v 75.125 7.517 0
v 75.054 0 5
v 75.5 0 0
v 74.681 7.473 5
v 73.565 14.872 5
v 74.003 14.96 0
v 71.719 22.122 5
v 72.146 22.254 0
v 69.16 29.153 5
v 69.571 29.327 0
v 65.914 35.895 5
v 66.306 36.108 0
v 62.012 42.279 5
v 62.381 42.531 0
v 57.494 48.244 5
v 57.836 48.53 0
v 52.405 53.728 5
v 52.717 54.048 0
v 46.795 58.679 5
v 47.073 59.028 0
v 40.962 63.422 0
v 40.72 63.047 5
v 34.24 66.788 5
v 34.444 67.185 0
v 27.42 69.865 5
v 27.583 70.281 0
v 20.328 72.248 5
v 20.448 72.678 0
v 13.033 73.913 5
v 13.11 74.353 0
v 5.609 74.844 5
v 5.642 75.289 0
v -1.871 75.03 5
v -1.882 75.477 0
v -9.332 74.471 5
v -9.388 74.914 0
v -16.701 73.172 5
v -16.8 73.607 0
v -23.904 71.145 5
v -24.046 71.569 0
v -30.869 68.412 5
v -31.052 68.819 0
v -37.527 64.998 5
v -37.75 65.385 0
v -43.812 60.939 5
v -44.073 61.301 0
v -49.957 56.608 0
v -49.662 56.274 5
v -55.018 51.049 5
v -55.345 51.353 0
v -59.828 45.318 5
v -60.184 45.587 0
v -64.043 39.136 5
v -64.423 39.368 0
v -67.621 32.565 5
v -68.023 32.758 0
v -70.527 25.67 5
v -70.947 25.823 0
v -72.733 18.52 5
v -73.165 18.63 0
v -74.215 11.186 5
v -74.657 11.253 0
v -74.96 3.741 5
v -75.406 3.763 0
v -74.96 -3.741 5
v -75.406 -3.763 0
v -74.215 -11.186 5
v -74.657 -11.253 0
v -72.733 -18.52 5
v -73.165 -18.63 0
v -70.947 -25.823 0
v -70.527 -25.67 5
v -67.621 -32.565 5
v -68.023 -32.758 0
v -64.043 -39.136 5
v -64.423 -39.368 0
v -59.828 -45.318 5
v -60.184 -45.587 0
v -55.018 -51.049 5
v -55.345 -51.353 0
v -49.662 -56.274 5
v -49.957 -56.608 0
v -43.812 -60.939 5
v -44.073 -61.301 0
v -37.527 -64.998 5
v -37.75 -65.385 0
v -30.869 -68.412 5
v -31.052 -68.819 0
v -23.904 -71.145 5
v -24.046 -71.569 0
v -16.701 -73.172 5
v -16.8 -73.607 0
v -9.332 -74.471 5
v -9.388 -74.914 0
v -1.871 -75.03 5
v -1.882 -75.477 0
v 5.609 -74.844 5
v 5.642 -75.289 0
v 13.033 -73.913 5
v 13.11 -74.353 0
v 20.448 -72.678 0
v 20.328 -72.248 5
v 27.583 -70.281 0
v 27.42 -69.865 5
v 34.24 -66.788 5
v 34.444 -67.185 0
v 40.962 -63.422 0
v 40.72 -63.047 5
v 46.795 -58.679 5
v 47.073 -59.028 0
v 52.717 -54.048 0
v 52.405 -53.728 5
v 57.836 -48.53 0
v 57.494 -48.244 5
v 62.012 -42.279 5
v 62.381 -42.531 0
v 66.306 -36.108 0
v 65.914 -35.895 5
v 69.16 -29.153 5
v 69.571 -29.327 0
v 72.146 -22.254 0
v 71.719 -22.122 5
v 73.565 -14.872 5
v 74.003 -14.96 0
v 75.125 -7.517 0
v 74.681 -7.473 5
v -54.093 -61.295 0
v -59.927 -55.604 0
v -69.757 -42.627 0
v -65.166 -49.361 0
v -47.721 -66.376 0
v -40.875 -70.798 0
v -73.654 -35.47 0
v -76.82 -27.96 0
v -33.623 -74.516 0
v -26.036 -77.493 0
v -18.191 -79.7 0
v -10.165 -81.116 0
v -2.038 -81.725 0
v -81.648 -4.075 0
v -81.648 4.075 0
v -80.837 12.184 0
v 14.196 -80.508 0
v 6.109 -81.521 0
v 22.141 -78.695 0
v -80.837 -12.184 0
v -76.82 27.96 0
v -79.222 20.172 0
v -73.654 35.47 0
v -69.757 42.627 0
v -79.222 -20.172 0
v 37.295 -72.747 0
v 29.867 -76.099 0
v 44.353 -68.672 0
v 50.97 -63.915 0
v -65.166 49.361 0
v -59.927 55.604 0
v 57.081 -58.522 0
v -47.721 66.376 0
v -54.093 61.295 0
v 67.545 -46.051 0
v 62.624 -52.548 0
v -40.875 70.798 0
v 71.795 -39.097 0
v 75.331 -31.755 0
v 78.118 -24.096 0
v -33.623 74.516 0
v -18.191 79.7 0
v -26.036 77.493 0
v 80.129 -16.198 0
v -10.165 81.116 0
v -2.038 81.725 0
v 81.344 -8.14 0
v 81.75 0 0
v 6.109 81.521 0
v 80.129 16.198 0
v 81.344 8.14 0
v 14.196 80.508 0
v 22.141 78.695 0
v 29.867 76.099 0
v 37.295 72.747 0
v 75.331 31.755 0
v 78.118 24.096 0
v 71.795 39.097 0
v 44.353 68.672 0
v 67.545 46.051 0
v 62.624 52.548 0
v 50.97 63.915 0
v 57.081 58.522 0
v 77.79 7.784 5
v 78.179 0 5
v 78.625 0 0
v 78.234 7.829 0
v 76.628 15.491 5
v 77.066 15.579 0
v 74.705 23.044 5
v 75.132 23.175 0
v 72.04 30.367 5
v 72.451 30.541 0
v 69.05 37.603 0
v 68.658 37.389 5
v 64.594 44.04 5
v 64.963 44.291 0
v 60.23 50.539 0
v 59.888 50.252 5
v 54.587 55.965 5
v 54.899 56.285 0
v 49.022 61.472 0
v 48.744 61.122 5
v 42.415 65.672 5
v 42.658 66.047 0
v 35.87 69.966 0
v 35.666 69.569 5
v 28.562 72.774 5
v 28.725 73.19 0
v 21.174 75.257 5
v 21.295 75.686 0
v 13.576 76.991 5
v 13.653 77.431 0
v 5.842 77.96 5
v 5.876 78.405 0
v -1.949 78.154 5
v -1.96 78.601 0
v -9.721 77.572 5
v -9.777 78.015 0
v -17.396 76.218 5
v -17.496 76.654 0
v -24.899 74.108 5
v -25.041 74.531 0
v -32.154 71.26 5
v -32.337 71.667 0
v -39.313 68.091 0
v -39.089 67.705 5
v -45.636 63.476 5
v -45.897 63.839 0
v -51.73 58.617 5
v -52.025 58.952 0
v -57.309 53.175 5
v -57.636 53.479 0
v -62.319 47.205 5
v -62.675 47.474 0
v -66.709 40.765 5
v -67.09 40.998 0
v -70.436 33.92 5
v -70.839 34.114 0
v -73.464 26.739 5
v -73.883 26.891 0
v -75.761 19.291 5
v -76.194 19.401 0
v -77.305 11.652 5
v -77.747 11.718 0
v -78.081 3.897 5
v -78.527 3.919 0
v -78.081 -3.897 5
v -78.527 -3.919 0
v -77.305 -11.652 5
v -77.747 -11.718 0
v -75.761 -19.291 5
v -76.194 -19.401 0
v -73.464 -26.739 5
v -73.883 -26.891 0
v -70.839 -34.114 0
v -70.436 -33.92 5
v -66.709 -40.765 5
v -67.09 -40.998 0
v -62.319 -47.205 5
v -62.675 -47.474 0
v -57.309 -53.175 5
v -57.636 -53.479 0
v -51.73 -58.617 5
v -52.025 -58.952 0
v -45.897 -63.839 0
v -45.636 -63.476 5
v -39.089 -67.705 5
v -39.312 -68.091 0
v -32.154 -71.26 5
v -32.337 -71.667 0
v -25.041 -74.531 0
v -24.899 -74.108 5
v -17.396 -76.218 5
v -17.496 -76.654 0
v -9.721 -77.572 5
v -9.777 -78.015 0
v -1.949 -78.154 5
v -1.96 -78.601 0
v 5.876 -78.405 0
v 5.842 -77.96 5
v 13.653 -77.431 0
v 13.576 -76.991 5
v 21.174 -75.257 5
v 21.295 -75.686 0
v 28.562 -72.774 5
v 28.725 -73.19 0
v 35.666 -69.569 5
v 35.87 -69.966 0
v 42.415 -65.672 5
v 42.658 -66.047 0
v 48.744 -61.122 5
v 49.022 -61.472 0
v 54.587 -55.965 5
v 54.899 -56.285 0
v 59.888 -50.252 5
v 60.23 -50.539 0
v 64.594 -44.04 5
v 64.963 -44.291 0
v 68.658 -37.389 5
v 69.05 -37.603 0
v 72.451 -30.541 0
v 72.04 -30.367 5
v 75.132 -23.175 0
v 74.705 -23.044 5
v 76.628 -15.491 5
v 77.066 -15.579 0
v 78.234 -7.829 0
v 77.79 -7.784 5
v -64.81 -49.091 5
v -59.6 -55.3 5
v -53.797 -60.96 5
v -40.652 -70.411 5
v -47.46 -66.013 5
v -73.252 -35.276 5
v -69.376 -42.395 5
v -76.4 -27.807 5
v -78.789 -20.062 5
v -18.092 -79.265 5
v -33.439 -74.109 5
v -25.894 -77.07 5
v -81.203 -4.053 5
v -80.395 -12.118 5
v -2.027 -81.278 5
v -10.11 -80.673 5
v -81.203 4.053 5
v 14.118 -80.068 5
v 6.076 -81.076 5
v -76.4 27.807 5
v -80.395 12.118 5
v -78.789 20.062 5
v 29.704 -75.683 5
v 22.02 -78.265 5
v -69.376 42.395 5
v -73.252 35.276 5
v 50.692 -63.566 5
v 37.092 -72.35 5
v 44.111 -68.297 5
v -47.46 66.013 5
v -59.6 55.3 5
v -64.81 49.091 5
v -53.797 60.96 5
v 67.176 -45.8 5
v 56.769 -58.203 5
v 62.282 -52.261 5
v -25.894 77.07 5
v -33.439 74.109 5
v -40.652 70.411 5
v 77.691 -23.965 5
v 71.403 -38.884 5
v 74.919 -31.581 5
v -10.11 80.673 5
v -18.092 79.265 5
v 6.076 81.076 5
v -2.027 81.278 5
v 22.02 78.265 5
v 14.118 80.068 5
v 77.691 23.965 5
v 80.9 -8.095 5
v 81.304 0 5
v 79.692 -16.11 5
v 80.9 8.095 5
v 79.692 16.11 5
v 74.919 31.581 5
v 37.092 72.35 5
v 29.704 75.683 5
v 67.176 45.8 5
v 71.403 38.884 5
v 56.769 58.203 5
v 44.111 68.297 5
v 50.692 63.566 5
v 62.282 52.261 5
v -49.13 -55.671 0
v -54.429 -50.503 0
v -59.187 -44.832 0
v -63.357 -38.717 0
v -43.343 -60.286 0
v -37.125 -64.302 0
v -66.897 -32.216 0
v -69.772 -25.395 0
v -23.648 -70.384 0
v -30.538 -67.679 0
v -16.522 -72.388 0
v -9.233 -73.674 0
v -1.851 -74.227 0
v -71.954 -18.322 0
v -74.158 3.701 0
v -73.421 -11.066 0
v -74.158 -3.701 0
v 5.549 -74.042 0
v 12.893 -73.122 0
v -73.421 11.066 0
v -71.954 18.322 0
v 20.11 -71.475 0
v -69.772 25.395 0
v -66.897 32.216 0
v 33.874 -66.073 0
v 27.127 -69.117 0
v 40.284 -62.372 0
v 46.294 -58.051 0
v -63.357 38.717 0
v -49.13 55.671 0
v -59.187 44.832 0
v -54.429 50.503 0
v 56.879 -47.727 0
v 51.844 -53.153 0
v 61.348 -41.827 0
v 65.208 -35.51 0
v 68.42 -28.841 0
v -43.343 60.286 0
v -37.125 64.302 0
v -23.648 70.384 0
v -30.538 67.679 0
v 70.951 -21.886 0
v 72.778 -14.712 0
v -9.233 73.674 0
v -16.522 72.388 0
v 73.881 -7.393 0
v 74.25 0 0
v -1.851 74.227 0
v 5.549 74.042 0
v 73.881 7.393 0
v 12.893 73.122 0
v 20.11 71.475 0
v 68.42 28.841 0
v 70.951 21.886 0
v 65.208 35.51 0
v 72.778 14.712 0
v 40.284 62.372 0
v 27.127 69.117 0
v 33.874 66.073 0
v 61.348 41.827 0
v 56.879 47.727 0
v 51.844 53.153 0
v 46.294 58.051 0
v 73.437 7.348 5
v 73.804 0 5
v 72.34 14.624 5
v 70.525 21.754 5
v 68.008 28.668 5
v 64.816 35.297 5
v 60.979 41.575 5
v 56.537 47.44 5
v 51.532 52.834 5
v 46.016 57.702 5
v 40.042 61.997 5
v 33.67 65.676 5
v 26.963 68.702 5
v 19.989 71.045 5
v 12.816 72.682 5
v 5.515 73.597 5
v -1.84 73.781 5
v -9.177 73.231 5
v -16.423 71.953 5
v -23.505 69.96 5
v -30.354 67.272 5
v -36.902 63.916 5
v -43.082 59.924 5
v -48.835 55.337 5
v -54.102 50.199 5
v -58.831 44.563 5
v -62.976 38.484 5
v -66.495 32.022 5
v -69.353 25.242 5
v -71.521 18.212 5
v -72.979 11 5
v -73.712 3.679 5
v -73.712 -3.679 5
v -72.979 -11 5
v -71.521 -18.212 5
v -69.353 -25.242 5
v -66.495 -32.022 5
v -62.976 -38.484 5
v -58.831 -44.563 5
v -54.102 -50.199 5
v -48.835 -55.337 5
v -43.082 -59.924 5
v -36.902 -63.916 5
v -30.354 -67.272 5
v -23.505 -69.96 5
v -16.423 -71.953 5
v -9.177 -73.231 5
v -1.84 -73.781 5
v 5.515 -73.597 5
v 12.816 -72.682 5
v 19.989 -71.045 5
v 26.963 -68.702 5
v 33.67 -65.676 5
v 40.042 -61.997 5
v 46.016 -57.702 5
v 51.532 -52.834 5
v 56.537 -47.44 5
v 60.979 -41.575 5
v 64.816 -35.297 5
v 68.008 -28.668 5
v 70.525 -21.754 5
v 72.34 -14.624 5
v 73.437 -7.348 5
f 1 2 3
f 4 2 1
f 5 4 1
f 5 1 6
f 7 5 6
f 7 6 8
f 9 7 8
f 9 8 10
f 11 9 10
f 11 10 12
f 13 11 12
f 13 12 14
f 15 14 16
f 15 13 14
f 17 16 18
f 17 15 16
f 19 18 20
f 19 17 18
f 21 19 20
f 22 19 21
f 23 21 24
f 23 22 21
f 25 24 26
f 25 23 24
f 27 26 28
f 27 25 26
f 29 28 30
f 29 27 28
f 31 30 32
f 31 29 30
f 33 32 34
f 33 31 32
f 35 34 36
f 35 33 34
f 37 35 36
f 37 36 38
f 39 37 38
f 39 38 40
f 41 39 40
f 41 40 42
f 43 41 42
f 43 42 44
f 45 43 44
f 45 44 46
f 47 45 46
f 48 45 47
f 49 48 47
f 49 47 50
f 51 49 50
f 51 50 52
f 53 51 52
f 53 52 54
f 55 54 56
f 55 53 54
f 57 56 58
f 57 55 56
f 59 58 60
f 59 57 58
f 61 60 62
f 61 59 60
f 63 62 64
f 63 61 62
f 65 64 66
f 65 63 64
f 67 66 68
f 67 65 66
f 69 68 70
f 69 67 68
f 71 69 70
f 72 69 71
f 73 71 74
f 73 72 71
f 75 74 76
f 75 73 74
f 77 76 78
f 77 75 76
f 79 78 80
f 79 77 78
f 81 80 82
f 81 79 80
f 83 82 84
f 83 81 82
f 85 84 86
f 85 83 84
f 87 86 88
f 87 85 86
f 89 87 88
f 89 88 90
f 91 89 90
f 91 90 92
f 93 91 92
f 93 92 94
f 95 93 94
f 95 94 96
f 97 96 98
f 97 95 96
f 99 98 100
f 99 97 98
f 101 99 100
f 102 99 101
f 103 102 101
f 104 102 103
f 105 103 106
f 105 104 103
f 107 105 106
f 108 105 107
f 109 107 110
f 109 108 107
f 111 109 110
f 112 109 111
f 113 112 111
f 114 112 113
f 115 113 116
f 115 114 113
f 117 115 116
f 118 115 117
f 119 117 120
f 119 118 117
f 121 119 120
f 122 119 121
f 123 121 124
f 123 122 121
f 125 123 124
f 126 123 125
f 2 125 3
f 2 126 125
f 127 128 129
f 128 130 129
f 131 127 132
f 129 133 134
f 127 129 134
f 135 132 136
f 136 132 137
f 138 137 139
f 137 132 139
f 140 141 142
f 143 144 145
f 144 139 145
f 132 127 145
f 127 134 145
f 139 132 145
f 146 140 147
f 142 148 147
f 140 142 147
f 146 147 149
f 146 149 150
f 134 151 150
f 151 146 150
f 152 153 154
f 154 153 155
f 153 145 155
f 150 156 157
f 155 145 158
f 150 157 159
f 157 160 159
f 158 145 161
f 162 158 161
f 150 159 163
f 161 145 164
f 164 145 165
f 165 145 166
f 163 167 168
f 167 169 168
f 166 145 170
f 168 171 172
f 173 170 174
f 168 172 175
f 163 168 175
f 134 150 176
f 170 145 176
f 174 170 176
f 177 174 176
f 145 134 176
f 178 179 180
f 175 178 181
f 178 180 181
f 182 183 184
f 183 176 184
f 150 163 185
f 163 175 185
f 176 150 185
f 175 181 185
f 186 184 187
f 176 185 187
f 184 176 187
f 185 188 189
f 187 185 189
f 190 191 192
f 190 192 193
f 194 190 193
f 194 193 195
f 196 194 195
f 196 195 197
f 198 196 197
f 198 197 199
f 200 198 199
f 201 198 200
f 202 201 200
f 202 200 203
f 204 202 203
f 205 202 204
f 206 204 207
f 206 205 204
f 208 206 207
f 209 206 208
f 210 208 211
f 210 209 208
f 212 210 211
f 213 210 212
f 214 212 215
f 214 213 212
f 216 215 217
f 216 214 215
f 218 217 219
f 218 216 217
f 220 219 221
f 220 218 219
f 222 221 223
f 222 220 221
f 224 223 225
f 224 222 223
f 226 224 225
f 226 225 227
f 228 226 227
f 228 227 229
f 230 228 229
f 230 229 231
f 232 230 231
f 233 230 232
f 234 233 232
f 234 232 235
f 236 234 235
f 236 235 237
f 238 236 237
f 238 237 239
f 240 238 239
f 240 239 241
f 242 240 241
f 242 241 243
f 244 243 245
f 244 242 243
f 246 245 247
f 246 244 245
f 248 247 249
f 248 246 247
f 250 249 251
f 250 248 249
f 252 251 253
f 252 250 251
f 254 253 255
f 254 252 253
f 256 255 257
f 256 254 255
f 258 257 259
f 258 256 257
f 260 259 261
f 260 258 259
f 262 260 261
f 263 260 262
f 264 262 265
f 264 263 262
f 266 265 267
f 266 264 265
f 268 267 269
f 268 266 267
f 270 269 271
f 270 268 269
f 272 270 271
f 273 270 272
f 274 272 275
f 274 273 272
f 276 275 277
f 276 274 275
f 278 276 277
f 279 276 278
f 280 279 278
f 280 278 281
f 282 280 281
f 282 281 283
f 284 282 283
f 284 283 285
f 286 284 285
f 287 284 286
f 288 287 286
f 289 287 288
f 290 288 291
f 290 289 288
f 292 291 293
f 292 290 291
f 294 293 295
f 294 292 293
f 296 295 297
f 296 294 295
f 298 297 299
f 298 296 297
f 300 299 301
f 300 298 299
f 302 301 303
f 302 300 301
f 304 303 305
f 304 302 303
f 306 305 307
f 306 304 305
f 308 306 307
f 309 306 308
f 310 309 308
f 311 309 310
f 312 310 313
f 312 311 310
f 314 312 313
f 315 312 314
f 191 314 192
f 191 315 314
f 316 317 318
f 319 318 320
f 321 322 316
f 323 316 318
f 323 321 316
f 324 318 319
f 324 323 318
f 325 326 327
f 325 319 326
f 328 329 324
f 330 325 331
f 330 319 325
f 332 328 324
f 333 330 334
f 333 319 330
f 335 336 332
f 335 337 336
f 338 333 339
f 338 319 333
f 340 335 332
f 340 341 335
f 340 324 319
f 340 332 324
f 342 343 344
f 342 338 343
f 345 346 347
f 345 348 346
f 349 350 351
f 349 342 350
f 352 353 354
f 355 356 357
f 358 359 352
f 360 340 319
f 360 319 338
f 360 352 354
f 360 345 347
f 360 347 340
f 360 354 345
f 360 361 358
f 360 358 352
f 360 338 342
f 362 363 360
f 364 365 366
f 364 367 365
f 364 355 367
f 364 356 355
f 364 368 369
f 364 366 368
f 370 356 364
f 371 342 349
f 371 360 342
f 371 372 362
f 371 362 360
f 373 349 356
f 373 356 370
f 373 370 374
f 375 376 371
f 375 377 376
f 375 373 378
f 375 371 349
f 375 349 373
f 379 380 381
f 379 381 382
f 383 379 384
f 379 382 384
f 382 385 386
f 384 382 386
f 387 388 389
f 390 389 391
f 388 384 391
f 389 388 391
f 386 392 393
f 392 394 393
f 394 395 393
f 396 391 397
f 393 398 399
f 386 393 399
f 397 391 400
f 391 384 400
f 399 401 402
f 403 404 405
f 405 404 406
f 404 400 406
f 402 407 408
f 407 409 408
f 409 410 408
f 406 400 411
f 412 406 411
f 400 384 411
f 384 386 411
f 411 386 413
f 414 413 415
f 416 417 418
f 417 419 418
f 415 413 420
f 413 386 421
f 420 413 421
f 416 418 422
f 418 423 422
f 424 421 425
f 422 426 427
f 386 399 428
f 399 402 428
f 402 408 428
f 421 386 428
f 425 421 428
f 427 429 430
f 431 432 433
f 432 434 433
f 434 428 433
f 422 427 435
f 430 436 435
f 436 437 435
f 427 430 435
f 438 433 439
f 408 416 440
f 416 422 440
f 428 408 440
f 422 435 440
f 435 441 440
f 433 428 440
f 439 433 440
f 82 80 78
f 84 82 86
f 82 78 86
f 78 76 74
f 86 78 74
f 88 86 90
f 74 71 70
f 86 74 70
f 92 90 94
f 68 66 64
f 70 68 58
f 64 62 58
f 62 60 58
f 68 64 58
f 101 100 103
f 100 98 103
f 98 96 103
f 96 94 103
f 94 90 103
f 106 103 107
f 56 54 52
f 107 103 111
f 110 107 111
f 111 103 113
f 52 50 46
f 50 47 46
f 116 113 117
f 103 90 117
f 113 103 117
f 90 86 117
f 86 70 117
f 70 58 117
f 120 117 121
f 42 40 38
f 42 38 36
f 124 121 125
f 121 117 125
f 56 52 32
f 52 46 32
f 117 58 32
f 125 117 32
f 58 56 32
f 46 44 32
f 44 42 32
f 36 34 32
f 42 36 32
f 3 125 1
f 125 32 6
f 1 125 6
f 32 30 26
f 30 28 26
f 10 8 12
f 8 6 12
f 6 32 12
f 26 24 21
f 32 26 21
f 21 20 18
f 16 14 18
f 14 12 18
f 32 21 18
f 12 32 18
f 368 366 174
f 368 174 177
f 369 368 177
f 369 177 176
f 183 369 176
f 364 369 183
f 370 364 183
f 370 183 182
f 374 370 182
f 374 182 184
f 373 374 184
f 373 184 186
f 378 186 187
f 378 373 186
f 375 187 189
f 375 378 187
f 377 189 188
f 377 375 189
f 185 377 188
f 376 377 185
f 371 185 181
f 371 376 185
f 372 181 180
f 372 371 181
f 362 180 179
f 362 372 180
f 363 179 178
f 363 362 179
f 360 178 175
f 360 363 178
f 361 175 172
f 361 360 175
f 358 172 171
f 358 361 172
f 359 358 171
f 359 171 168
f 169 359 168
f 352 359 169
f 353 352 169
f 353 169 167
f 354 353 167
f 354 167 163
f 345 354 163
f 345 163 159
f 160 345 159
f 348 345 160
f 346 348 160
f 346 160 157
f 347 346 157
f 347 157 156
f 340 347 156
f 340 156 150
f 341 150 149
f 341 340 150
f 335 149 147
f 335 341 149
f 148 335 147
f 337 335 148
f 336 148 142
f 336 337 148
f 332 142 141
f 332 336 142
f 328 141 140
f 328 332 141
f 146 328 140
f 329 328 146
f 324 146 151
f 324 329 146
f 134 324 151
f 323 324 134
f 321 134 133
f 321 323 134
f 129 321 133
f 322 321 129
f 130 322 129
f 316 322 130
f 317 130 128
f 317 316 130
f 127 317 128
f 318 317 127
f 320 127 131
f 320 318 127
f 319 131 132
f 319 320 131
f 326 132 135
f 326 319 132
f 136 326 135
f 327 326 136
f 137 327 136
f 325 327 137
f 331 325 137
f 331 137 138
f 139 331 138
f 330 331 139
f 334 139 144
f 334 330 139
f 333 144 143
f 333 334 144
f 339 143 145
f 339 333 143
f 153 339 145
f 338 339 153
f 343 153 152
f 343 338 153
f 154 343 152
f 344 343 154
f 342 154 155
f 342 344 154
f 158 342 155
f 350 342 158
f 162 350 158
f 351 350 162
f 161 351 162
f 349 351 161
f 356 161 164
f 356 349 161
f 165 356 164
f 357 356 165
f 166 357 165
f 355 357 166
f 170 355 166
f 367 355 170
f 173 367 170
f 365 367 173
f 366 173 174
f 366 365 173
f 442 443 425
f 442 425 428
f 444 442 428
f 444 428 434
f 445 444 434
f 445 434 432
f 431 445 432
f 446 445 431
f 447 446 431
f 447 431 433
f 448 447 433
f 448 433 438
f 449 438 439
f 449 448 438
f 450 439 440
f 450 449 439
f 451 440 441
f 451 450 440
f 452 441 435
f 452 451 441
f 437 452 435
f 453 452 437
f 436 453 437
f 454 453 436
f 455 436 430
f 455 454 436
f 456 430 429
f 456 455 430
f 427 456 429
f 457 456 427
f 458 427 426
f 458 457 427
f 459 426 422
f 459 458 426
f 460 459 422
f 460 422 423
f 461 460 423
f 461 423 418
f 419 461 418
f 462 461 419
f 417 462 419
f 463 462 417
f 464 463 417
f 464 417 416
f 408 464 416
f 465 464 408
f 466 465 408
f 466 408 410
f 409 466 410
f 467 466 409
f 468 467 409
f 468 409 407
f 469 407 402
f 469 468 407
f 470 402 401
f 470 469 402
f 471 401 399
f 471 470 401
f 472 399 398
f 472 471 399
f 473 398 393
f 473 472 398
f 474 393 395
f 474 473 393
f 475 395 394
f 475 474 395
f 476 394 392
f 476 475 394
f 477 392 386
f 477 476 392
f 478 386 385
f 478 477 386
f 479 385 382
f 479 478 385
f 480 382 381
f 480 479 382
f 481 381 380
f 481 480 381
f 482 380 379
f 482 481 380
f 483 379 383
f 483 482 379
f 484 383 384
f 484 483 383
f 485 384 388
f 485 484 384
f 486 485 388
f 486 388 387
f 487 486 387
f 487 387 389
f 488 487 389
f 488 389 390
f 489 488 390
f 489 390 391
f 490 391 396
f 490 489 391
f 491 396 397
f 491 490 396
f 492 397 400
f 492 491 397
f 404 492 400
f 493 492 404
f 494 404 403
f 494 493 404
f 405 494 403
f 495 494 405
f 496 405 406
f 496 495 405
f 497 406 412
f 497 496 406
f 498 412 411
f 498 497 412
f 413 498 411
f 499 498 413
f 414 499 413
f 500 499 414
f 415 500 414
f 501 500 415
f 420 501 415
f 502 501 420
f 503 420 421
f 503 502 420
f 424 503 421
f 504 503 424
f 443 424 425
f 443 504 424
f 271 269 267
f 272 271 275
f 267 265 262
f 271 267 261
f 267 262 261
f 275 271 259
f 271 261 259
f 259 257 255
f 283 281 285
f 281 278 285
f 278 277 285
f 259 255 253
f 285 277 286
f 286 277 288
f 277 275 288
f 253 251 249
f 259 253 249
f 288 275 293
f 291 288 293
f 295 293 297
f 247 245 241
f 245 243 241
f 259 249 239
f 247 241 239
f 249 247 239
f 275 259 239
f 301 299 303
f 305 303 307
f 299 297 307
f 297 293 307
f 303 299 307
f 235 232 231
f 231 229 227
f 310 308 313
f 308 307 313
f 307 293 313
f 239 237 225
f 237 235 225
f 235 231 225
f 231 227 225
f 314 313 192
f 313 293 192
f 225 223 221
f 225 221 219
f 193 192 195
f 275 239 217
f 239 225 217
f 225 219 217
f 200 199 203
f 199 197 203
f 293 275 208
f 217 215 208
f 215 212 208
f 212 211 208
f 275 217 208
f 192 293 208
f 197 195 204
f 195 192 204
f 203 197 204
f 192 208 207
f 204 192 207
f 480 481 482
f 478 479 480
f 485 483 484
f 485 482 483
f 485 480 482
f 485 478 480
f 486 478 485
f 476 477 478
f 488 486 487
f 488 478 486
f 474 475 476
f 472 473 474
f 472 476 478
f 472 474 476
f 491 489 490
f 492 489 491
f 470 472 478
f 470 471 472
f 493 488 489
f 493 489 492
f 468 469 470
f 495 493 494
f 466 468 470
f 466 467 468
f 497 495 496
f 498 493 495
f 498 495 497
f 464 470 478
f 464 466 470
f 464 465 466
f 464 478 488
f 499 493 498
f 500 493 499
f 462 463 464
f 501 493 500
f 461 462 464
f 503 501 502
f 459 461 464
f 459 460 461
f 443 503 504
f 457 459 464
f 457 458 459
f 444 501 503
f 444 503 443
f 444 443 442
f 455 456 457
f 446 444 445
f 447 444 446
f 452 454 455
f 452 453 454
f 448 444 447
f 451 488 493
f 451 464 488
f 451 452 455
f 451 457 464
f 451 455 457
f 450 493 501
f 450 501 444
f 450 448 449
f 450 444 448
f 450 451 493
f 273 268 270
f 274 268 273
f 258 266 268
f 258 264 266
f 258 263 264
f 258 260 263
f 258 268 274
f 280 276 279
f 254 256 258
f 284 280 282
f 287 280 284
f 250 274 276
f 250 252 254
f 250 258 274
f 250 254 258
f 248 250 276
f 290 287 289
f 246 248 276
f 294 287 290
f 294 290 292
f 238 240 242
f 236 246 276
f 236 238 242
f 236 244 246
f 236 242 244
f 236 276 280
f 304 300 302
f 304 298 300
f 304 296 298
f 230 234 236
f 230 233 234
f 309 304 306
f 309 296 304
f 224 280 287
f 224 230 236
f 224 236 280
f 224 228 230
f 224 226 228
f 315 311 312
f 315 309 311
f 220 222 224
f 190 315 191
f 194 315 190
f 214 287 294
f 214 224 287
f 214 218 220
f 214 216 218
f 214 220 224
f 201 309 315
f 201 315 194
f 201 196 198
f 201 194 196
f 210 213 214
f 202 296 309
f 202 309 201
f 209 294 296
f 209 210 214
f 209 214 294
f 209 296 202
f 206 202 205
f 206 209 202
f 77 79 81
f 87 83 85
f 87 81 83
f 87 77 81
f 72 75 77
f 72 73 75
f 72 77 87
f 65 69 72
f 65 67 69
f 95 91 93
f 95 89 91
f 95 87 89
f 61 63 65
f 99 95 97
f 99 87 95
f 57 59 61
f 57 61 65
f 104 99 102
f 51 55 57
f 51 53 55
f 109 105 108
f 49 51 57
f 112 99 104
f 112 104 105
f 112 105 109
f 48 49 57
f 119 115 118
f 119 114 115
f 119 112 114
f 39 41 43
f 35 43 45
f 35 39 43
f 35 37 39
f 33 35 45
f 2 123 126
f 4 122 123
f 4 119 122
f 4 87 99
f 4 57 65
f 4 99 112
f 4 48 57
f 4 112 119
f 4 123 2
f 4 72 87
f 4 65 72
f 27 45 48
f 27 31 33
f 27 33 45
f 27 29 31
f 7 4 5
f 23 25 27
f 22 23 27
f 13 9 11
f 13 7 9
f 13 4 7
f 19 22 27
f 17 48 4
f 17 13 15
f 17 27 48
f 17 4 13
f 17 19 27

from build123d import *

# Parameters (mm, degrees)
F6_R      = 81.75
F7_DEPTH  = 5
F7_TAPER  = 5.1021652524
F8_R      = 78.625
F9_DEPTH  = 5
F9_TAPER  = 5.1021652524
F10_R     = 75.5
F11_DEPTH = 5
F11_TAPER = 5.1021652524
F12_R     = 74.25
F13_DEPTH = 5
F13_TAPER = 5.1021652524


with BuildPart() as f7:
    # F6 (on Top) → F7 (new body)
    with BuildSketch(Plane.XY):
        Circle(F6_R)
    extrude(amount=F7_DEPTH, taper=F7_TAPER)


with BuildPart() as f9:
    # F8 (on Top) → F9 (new body)
    with BuildSketch(Plane.XY):
        Circle(F8_R)
    extrude(amount=F9_DEPTH, taper=F9_TAPER)


with BuildPart() as f11:
    # F10 (on Top) → F11 (new body)
    with BuildSketch(Plane.XY):
        Circle(F10_R)
    extrude(amount=F11_DEPTH, taper=F11_TAPER)


with BuildPart() as f13:
    # F12 (on Top) → F13 (new body)
    with BuildSketch(Plane.XY):
        Circle(F12_R)
    extrude(amount=F13_DEPTH, taper=F13_TAPER)


solid = Compound([f7.part, f9.part, f11.part, f13.part])
